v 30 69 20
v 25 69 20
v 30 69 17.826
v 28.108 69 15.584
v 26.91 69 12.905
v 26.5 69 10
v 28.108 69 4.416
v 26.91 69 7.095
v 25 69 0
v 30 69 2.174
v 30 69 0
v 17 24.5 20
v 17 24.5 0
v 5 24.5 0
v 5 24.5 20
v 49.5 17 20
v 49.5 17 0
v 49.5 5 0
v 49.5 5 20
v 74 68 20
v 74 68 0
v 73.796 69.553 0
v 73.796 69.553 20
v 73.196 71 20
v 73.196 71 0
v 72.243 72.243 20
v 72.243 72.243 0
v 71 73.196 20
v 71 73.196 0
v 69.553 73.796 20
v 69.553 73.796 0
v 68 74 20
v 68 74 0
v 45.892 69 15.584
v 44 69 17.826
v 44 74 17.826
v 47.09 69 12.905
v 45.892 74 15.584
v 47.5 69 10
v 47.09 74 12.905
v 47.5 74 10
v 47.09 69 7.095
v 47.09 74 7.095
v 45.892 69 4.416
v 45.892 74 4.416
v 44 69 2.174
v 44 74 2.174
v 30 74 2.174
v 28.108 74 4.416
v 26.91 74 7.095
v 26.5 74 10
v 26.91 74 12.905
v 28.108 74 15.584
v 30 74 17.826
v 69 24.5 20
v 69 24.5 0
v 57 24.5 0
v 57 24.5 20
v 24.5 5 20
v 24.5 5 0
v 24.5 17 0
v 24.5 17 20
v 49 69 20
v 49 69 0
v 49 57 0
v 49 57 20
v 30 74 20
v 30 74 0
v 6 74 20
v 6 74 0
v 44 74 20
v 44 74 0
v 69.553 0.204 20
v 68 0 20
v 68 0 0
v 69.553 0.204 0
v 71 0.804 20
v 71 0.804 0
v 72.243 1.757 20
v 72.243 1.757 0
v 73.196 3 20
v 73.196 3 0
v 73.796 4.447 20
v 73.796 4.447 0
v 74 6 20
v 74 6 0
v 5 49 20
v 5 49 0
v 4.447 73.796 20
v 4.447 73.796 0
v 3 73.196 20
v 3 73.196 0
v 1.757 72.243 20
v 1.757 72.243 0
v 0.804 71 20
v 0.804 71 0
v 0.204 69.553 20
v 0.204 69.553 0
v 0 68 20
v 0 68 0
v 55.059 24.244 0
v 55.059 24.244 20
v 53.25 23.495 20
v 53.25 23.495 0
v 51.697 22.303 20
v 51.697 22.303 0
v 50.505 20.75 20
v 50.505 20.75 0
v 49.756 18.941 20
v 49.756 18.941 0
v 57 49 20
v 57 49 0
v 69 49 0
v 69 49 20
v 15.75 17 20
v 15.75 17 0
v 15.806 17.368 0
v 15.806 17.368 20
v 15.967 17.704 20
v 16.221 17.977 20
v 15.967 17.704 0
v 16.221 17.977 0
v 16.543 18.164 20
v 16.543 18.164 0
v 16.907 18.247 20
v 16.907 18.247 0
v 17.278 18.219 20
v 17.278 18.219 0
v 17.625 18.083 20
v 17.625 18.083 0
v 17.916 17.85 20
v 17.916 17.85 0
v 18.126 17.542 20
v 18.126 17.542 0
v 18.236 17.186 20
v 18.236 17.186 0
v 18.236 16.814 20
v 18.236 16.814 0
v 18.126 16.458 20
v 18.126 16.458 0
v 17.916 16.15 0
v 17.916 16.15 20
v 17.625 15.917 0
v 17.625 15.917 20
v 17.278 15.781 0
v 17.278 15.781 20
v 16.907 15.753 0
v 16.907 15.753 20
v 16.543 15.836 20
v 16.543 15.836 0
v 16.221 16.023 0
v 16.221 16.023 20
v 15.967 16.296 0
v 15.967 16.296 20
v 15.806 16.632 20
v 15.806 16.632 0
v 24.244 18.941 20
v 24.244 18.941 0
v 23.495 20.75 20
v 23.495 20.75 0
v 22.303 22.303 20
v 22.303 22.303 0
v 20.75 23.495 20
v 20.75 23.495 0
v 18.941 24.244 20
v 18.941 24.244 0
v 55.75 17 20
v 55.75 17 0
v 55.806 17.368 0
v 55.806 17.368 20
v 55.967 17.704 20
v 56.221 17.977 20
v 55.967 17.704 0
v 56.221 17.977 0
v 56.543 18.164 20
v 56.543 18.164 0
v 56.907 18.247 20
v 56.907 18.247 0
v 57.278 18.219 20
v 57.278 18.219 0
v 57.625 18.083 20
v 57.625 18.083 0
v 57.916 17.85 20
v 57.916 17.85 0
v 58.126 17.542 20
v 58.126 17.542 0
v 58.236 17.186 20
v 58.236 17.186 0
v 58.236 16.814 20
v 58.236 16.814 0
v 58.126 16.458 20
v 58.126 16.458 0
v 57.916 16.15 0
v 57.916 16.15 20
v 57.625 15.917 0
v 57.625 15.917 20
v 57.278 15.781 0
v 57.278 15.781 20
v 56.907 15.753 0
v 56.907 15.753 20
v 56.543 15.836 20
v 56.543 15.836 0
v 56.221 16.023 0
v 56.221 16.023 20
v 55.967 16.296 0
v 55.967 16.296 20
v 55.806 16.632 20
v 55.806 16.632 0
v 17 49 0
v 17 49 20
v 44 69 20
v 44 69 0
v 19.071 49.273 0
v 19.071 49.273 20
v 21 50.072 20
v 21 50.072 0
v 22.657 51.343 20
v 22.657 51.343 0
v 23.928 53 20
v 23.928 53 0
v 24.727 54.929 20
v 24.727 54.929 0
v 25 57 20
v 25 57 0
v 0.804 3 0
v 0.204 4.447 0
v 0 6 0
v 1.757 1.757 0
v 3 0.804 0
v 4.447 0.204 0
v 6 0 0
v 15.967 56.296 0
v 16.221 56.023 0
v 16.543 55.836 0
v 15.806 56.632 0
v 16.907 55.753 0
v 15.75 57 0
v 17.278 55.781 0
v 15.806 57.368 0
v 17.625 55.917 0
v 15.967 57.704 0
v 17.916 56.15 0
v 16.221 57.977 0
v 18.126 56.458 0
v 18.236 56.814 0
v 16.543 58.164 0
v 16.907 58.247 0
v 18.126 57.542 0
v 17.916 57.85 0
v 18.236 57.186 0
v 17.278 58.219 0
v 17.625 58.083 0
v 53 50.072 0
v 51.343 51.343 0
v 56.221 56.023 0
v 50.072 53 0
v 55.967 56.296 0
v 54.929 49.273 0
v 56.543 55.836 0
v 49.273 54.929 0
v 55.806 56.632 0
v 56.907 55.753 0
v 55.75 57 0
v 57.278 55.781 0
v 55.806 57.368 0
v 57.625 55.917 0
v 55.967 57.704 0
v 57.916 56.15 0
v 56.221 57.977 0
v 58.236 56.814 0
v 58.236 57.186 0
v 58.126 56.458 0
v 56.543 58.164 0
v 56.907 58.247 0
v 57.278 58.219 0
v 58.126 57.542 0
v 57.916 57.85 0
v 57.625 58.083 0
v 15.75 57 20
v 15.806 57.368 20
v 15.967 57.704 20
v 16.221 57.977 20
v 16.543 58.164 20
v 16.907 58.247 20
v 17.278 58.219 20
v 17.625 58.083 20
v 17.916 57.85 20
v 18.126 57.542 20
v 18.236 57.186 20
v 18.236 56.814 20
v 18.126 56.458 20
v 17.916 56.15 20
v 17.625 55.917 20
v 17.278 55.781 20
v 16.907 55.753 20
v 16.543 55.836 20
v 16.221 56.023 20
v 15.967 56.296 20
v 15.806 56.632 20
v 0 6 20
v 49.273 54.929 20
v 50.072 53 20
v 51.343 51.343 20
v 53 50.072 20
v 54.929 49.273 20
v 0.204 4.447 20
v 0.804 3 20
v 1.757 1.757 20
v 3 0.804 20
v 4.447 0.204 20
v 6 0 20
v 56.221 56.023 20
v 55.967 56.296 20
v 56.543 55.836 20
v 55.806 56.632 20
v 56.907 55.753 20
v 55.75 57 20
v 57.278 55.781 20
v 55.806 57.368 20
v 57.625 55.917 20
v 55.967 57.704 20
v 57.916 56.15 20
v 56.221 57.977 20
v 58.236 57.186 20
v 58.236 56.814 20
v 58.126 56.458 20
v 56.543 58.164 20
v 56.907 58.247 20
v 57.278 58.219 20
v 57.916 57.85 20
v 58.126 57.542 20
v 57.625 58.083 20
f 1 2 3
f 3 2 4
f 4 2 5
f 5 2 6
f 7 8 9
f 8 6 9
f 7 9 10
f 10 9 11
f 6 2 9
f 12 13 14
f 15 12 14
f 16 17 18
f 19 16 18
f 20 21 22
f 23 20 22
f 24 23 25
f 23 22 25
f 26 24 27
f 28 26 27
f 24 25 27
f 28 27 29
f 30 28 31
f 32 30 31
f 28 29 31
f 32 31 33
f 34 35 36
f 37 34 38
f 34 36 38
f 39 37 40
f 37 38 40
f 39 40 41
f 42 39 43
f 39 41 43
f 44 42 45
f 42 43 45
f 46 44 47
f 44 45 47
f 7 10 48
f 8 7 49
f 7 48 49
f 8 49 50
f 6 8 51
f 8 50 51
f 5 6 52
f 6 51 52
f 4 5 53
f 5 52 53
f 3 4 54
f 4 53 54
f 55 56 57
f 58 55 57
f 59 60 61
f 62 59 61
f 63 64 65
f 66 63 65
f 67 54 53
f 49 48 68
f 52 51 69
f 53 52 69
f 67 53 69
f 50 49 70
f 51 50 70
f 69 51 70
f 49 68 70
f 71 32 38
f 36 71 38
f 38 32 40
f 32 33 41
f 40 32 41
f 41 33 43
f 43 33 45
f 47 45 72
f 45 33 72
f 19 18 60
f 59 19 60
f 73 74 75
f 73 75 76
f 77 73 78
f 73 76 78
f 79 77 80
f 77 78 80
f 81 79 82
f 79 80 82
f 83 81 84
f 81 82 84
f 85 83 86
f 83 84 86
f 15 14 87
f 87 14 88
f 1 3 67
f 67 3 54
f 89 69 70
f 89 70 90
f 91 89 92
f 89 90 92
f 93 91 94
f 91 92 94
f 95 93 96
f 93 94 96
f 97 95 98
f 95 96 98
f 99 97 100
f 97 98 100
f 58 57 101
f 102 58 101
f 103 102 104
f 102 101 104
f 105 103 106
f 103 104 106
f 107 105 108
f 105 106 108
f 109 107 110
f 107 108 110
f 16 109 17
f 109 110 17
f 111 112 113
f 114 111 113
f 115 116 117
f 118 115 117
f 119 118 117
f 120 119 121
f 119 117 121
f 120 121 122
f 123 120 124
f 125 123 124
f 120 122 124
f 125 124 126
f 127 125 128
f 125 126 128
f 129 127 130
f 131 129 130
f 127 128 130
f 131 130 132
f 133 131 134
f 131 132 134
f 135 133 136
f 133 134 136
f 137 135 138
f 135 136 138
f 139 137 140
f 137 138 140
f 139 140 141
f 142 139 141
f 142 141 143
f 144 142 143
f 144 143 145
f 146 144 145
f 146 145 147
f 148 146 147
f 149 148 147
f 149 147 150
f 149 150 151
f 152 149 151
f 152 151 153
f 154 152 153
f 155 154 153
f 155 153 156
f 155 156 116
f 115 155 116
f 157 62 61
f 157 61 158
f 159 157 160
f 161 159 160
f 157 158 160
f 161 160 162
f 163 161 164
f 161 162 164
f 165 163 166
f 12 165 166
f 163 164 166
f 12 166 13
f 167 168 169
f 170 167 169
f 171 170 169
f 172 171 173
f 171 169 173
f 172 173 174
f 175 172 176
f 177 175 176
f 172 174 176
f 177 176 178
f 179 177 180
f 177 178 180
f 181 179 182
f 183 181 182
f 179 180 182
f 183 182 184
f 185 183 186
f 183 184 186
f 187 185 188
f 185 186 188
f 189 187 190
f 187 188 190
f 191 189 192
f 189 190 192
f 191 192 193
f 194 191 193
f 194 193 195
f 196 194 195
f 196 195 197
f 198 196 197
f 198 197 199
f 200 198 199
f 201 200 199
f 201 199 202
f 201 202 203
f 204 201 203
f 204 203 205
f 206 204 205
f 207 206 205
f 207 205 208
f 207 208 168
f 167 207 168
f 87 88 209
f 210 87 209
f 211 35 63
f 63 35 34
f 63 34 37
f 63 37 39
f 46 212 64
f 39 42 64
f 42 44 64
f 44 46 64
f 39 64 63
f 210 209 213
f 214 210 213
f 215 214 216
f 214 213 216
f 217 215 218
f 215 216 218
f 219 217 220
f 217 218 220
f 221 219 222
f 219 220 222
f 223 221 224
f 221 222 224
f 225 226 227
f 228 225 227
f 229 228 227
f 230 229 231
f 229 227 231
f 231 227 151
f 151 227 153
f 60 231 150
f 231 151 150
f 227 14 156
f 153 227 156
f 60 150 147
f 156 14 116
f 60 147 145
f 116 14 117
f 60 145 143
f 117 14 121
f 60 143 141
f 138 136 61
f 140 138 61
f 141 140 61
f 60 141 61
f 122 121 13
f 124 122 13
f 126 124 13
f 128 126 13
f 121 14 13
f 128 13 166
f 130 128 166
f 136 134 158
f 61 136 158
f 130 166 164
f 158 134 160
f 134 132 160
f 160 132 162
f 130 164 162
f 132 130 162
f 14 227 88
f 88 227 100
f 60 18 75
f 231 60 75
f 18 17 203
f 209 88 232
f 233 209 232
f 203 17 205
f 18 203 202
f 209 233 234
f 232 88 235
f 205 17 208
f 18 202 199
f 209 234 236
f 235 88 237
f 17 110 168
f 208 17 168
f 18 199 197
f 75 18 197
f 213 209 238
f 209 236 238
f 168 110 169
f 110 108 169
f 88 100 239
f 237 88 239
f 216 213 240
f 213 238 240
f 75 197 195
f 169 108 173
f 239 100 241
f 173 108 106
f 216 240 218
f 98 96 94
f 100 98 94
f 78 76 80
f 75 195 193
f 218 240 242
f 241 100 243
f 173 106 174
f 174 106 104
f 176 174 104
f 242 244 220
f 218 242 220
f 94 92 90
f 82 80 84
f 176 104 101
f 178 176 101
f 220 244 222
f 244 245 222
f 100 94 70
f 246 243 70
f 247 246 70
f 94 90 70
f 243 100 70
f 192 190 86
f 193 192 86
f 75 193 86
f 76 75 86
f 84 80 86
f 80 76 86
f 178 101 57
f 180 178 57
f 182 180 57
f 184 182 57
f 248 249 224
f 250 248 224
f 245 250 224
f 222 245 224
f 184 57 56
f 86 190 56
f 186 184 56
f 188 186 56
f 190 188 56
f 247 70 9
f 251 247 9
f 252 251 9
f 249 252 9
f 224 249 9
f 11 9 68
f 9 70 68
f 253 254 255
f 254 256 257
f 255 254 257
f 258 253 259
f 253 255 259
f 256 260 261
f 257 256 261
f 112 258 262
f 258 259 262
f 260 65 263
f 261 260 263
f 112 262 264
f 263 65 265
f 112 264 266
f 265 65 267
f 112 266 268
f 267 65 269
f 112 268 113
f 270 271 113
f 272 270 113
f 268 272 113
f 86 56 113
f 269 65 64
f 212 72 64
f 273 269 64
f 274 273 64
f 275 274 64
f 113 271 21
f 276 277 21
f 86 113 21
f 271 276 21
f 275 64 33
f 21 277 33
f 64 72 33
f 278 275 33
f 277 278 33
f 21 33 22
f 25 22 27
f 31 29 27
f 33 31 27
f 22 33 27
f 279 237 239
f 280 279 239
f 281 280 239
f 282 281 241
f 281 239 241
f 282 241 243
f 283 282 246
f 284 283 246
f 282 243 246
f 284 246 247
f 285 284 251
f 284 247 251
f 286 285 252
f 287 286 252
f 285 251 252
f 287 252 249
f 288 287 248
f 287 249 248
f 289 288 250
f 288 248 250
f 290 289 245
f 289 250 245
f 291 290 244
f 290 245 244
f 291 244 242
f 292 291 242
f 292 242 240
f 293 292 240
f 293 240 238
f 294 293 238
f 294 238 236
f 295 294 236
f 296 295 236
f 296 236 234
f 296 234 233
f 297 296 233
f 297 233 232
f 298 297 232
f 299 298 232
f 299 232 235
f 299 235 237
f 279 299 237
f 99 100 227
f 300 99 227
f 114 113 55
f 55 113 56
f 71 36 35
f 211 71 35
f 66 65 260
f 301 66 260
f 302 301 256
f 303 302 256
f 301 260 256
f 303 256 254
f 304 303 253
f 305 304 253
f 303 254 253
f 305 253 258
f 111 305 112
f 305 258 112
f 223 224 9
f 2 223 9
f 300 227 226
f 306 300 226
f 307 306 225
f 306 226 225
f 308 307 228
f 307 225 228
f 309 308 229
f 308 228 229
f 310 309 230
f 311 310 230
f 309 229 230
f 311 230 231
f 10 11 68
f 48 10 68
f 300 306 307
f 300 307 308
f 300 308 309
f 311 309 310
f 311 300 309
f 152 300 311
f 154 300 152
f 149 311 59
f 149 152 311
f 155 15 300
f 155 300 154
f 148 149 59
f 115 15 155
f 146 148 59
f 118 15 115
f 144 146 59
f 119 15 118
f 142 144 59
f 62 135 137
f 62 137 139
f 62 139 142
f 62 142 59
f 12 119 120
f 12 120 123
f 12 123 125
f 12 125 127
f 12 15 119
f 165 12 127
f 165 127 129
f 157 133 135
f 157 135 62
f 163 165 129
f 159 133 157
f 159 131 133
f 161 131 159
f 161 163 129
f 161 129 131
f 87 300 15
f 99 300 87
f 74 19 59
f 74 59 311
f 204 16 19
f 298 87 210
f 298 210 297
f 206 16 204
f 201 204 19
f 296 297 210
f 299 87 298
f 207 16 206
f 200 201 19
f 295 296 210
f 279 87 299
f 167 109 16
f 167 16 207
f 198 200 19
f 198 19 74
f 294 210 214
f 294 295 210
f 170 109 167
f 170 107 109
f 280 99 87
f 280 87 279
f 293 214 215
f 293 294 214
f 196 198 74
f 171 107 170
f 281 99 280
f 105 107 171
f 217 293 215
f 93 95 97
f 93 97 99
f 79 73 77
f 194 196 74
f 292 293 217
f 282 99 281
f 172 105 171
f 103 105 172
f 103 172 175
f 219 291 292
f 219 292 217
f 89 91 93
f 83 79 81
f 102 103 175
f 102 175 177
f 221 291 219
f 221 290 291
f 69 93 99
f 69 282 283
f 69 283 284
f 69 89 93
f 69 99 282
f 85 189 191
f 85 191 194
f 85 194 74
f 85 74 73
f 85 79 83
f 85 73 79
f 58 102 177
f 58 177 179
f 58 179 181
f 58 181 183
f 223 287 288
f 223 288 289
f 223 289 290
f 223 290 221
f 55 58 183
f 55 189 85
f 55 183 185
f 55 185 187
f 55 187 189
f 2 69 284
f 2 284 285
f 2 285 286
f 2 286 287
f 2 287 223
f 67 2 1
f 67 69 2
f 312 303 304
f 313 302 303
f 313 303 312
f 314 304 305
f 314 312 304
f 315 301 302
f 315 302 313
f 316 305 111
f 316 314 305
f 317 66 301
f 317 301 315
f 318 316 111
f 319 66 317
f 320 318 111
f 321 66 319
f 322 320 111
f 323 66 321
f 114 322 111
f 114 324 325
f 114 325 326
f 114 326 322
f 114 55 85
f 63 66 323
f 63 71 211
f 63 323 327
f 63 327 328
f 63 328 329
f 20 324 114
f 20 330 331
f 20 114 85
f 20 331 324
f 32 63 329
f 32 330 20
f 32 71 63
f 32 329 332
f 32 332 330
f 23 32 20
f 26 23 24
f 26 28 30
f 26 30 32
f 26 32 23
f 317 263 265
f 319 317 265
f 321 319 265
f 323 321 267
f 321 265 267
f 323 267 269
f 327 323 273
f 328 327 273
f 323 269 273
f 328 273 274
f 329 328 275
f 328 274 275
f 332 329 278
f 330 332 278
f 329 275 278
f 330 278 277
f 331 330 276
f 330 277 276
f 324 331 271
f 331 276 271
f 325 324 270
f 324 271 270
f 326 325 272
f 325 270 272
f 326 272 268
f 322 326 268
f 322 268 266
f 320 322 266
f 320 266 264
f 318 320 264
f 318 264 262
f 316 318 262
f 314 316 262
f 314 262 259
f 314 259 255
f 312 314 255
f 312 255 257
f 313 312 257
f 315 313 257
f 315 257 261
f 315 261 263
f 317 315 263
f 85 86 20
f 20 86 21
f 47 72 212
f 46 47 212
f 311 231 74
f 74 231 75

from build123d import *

# Parameters (mm, degrees)
F1_DEPTH = 20
F3_DEPTH = 25
F6_D     = 2.5


with BuildPart() as f1:
    # F0 (on Top) → F1 (new body)
    with BuildSketch(Plane.XY):
        with BuildLine():
            Line((0, 68), (0, 6))
            ThreePointArc((0, 6), (1.757359, 1.757359), (6, 0))
            Line((6, 0), (37, 0))
            Line((37, 0), (68, 0))
            ThreePointArc((68, 0), (72.242641, 1.757359), (74, 6))
            Line((74, 6), (74, 68))
            ThreePointArc((74, 68), (72.242641, 72.242641), (68, 74))
            Line((68, 74), (44, 74))
            Line((44, 74), (44, 69))
            Line((44, 69), (49, 69))
            Line((49, 69), (49, 57))
            ThreePointArc((49, 57), (51.343146, 51.343146), (57, 49))
            Line((57, 49), (69, 49))
            Line((69, 49), (69, 24.5))
            Line((69, 24.5), (57, 24.5))
            ThreePointArc((57, 24.5), (51.696699, 22.303301), (49.5, 17))
            Line((49.5, 17), (49.5, 5))
            Line((49.5, 5), (24.5, 5))
            Line((24.5, 5), (24.5, 17))
            ThreePointArc((24.5, 17), (22.303301, 22.303301), (17, 24.5))
            Line((17, 24.5), (5, 24.5))
            Line((5, 24.5), (5, 49))
            Line((5, 49), (17, 49))
            ThreePointArc((17, 49), (22.656854, 51.343146), (25, 57))
            Line((25, 57), (25, 69))
            Line((25, 69), (30, 69))
            Line((30, 69), (30, 74))
            Line((30, 74), (6, 74))
            ThreePointArc((6, 74), (1.757359, 72.242641), (0, 68))
        make_face()
    extrude(amount=F1_DEPTH)


with BuildPart() as f3:
    # F2 (on face) → F3 (new body)
    with BuildSketch(Plane(origin=(0, 74, 0), x_dir=(-1, 0, 0), z_dir=(0, 1, 0))):
        with BuildLine():
            ThreePointArc((-26.5, 10), (-37, 20.5), (-47.5, 10))
            Line((-47.5, 10), (-26.5, 10))
        make_face()
        with BuildLine():
            Line((-26.5, 10), (-47.5, 10))
            ThreePointArc((-47.5, 10), (-37, -0.5), (-26.5, 10))
        make_face()
    extrude(amount=-F3_DEPTH)


with BuildPart() as f1_1:
    add(f1.part)

    # F4: cut F3
    add(f3.part, mode=Mode.SUBTRACT)

    # F6 (through all)
    with Locations(Plane.XY.offset(20)):
        with Locations((17, 57), (57, 57), (57, 17), (17, 17)):
            Hole(F6_D / 2)


solid = f1_1.part
